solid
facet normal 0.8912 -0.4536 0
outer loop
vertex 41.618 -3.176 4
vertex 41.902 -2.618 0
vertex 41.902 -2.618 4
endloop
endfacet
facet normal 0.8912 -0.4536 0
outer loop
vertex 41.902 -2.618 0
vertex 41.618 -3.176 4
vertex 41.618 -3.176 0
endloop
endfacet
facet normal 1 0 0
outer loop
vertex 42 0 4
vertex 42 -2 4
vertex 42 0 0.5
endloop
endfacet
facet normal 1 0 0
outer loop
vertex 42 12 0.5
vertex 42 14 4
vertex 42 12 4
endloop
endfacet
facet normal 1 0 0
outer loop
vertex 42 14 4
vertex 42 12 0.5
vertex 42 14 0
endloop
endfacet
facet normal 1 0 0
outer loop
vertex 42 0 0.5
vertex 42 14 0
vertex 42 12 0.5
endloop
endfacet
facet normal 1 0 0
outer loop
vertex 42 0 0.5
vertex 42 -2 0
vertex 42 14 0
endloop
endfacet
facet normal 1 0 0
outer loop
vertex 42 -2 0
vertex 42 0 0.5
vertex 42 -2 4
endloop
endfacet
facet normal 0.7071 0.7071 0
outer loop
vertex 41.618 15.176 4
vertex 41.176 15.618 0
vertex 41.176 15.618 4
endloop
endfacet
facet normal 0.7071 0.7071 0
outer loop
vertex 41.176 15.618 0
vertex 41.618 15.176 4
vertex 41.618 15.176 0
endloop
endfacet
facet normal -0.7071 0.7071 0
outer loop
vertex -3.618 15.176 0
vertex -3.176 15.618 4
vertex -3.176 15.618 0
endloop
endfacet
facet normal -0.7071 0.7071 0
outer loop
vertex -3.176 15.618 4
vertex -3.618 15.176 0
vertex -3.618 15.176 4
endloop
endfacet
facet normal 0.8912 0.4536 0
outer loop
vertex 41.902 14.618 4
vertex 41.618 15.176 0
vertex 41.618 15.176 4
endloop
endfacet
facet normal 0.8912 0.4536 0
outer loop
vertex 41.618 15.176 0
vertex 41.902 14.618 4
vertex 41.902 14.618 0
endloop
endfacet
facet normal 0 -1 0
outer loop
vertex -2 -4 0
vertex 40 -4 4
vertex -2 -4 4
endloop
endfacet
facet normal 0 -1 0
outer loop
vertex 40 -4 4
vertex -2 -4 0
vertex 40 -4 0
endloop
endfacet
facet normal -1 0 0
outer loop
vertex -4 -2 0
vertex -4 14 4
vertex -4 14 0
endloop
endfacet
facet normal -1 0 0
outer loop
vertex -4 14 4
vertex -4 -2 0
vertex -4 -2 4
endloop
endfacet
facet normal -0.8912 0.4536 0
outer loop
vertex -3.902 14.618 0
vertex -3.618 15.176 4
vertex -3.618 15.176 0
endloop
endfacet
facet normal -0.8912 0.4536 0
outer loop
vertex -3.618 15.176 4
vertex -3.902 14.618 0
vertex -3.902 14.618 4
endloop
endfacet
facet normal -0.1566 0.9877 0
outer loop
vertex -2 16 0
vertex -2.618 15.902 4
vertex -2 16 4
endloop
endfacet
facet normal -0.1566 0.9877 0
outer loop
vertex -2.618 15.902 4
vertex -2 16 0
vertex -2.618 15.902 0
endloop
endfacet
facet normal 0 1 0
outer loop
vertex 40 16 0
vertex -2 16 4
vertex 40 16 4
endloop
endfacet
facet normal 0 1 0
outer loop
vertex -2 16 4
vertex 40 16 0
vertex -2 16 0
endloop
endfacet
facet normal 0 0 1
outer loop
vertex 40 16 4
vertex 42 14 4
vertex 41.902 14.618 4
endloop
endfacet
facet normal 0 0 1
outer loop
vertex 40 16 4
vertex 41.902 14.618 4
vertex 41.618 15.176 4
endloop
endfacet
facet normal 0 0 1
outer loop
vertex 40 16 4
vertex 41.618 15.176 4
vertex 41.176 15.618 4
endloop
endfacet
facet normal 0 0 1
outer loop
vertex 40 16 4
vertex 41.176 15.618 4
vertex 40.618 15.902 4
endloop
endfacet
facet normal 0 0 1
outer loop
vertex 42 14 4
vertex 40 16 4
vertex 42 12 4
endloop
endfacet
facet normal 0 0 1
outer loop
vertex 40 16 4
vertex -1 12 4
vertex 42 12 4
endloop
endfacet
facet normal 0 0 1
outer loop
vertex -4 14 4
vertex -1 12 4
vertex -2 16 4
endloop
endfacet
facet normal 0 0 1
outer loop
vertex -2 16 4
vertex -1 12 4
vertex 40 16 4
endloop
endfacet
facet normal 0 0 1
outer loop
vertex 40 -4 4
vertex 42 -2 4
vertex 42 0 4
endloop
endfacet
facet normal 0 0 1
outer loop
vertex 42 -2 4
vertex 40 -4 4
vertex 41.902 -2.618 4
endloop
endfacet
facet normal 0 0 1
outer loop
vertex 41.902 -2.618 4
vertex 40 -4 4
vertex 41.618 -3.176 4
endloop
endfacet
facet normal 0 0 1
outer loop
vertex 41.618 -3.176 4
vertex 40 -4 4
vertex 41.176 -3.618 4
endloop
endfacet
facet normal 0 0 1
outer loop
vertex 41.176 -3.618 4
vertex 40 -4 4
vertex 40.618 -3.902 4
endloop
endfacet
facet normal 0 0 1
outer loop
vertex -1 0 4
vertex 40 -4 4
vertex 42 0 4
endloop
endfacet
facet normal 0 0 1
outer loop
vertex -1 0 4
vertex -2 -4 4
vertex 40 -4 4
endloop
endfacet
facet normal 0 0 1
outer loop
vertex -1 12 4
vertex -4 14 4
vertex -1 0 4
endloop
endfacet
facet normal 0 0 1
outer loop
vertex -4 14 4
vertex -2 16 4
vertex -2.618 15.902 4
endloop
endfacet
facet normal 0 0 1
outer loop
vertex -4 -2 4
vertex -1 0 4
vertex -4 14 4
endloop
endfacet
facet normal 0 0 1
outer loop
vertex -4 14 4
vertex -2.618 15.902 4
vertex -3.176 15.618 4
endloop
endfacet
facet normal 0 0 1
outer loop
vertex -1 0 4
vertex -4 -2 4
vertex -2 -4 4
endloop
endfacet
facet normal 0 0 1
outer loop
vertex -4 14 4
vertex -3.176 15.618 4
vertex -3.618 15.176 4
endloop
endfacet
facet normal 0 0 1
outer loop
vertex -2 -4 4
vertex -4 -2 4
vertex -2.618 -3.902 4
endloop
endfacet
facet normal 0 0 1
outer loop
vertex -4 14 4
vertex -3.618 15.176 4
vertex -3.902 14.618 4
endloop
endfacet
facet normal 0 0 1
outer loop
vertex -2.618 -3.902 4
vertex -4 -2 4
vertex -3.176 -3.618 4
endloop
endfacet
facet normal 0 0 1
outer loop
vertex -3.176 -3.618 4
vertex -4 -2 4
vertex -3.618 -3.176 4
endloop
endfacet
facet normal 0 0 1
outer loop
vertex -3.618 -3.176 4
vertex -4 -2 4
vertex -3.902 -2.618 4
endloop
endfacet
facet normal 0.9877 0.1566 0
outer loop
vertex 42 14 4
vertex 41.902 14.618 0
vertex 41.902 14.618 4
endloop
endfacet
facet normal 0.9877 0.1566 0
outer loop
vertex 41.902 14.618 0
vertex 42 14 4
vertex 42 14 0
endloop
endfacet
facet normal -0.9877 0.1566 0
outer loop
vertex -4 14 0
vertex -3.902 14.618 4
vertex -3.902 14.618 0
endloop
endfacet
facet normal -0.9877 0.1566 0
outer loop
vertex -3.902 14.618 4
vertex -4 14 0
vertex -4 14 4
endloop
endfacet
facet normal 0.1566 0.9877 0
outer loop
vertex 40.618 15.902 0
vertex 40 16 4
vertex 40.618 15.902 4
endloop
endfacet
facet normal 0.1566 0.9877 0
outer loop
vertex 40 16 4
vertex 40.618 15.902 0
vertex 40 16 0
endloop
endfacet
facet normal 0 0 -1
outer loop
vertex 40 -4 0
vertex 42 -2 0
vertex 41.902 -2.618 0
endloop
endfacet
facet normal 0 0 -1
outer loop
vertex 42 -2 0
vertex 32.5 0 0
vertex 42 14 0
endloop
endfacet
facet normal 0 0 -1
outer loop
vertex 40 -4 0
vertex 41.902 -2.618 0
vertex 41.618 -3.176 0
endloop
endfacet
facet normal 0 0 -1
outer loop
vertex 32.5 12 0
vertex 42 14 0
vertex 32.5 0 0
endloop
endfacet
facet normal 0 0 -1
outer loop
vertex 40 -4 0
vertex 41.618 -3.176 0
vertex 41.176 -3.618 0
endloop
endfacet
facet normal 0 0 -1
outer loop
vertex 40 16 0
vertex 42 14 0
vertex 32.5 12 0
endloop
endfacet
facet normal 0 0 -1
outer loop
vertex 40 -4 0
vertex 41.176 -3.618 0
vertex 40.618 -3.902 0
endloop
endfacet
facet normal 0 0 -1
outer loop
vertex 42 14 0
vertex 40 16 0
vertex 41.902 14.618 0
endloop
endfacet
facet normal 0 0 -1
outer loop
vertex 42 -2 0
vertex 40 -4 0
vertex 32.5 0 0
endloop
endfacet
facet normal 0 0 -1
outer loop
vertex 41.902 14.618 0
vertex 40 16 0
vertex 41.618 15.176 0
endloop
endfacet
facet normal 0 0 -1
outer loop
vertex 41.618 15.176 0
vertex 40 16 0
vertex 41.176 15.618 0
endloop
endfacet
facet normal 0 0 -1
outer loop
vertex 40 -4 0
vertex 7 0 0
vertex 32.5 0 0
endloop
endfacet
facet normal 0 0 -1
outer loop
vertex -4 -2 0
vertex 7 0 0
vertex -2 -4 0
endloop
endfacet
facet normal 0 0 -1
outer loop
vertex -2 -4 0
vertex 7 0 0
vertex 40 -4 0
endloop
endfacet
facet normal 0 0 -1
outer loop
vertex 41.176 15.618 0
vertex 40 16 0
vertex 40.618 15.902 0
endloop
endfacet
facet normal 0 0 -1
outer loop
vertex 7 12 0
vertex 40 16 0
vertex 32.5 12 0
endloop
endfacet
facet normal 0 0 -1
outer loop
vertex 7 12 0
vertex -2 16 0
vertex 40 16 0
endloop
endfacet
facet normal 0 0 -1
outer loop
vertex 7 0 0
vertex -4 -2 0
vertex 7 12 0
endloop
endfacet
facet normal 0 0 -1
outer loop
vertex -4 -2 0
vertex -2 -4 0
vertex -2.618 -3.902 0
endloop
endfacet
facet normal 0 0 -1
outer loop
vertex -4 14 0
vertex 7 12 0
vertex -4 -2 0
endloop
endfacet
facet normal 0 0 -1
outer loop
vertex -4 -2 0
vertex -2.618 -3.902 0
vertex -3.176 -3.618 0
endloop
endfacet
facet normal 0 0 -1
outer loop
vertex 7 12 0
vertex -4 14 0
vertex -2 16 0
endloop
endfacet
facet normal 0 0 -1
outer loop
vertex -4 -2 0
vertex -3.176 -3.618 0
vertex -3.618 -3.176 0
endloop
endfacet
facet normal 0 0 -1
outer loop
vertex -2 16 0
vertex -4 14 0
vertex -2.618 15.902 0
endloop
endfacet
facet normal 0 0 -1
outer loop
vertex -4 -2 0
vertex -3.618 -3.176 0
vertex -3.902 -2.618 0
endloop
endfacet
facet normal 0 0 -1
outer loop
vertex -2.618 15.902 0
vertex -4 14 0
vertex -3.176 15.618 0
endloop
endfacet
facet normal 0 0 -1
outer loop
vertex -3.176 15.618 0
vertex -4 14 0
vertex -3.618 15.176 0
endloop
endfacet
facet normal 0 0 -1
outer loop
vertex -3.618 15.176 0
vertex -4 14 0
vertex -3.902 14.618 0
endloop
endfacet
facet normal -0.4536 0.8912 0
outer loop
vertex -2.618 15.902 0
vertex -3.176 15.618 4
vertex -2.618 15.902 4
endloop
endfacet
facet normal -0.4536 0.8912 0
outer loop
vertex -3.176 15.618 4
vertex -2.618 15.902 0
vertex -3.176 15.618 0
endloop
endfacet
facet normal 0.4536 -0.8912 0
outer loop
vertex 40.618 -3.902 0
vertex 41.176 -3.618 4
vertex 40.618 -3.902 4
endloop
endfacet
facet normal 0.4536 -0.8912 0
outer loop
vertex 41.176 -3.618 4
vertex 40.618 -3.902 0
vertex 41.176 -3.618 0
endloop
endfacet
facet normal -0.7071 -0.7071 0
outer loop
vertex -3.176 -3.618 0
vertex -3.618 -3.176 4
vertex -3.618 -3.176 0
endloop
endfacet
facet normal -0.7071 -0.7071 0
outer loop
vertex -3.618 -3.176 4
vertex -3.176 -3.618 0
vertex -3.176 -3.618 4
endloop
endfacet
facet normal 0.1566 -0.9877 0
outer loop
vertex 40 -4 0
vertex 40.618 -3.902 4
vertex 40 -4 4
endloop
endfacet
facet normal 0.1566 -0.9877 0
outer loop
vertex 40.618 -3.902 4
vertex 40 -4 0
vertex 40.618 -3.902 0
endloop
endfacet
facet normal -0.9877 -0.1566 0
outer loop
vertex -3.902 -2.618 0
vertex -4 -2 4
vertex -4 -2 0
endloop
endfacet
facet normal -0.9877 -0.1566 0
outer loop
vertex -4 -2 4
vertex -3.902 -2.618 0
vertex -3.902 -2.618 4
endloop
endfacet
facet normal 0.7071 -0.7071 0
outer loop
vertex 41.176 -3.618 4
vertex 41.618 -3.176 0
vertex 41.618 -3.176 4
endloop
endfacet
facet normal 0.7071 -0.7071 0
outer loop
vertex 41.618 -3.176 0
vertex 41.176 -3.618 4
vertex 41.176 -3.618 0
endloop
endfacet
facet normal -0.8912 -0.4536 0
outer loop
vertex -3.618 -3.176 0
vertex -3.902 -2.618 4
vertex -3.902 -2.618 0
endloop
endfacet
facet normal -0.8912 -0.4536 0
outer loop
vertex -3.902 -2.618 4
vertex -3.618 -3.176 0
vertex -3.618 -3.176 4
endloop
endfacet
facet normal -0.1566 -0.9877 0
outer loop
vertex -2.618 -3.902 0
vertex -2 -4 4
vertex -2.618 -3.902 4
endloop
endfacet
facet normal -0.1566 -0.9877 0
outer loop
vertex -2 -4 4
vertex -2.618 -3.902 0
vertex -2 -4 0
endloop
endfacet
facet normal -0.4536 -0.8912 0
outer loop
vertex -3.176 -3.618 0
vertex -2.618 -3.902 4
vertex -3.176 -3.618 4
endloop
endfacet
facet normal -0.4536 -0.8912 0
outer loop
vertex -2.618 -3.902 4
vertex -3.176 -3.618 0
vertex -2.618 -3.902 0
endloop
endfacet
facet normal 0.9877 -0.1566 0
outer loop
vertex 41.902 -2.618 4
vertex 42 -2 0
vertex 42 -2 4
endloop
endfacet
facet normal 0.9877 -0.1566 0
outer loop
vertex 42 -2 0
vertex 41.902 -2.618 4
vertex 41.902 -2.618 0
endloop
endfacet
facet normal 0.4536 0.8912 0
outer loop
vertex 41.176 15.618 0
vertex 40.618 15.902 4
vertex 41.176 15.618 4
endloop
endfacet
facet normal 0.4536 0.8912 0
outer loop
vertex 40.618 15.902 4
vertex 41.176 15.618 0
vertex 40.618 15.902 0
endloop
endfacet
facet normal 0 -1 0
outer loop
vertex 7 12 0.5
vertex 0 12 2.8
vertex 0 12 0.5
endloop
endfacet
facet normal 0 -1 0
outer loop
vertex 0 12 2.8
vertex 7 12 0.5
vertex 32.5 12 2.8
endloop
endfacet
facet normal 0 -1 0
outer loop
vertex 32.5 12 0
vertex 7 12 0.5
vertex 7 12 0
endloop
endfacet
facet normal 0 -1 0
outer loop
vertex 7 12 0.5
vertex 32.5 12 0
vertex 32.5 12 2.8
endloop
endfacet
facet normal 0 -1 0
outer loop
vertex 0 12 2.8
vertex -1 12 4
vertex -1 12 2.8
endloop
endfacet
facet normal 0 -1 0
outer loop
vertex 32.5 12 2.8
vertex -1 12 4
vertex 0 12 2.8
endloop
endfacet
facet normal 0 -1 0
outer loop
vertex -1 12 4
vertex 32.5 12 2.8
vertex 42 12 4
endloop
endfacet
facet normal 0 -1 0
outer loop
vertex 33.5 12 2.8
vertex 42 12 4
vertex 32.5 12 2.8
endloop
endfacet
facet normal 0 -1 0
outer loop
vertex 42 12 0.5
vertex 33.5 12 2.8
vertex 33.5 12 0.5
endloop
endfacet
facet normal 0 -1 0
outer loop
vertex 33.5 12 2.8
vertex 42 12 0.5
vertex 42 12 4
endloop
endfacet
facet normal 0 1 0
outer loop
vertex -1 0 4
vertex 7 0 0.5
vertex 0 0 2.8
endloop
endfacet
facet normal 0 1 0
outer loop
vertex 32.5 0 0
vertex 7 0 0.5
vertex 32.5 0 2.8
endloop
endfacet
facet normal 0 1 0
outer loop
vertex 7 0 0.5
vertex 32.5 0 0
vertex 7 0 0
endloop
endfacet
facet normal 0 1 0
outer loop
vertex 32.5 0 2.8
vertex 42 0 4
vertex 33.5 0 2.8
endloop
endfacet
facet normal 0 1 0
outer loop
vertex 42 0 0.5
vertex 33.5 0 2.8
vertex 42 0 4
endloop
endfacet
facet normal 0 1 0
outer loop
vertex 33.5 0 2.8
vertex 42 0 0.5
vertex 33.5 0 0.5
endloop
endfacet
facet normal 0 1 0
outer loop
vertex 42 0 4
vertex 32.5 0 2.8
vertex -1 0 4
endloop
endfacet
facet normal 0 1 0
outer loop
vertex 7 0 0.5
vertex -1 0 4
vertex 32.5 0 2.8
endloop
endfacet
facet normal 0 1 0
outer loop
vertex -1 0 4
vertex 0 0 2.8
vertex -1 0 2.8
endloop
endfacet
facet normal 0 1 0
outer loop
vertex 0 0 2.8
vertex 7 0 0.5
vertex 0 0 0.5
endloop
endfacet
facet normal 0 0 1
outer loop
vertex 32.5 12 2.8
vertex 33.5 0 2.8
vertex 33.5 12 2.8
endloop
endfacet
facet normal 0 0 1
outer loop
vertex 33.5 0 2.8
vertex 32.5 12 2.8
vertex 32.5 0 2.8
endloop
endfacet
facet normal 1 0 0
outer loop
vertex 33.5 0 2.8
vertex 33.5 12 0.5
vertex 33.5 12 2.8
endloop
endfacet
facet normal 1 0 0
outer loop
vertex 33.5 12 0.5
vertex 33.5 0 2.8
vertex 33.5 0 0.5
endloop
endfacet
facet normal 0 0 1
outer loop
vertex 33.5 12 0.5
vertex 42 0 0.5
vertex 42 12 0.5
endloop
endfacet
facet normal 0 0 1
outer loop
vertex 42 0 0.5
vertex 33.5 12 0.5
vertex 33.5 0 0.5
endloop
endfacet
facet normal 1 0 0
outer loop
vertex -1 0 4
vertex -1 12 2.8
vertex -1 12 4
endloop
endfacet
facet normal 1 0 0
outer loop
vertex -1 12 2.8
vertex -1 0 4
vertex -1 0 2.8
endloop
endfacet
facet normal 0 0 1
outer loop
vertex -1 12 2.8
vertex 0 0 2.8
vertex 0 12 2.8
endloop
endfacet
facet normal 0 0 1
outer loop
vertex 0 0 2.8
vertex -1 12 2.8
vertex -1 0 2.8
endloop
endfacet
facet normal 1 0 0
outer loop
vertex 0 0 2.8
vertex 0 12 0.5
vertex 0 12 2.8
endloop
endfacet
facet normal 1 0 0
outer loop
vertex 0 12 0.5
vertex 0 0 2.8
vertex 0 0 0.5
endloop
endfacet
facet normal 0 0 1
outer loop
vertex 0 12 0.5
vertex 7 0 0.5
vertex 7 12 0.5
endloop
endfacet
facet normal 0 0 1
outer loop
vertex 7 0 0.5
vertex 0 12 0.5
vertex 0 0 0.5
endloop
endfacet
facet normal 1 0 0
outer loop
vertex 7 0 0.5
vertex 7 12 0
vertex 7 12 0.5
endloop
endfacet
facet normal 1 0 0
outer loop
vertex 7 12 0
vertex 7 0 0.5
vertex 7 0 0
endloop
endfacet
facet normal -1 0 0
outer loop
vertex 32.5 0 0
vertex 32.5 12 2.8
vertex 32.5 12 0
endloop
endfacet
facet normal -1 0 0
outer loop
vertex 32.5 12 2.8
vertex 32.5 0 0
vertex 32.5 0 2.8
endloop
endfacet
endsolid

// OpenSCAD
bodyWid     = 12;
bodyLen     = 38;
bodyDep     = 3;
windowLen   = 26;
windowOff   = 5;
windowDep   = 0.5;

epsilon     = 0.1;

$fn=20;

oled128x32 =[[0,4], [0,2.8], [1,2.8], [1,0.5], [8,0.5], [8,0], [33.5, 0], [33.5,2.8], [34.5, 2.8], [34.5, 0.5], [43, 0.5], [43,4]];


/* old version */
if (0) difference() {
   simpleForm();
   window();
}

difference() {
   simpleForm();
   translate([-1,bodyWid,0]) rotate([90,0,0]) linear_extrude(height=bodyWid) polygon(points=oled128x32);
}
   
// window();

module simpleForm(h=4) {
   hull() {
      translate([-2,-2,0]) cylinder(r=2,h=h);
      translate([-2,2+bodyWid,0]) cylinder(r=2,h=h);
      translate([2+bodyLen,2+bodyWid,0]) cylinder(r=2,h=h);
      translate([2+bodyLen,-2,0]) cylinder(r=2,h=h);
   }
}

module window() {
   translate([-1,0,2.8]) cube([bodyLen+7,bodyWid,2.8]); /* space for PCB */
   // translate([0,0,windowDep]) cube([windowLen+6.5,bodyWid,bodyDep-windowDep]);
   translate([0,0,windowDep]) cube([windowLen+6.5,bodyWid,bodyDep-windowDep]);
   translate([windowLen+7.5,0,windowDep]) cube([bodyLen,bodyWid,bodyDep-windowDep]);
   translate([7,0,-epsilon]) cube([windowLen,bodyWid,windowDep+2*epsilon]); /* opening for viewing */
}
